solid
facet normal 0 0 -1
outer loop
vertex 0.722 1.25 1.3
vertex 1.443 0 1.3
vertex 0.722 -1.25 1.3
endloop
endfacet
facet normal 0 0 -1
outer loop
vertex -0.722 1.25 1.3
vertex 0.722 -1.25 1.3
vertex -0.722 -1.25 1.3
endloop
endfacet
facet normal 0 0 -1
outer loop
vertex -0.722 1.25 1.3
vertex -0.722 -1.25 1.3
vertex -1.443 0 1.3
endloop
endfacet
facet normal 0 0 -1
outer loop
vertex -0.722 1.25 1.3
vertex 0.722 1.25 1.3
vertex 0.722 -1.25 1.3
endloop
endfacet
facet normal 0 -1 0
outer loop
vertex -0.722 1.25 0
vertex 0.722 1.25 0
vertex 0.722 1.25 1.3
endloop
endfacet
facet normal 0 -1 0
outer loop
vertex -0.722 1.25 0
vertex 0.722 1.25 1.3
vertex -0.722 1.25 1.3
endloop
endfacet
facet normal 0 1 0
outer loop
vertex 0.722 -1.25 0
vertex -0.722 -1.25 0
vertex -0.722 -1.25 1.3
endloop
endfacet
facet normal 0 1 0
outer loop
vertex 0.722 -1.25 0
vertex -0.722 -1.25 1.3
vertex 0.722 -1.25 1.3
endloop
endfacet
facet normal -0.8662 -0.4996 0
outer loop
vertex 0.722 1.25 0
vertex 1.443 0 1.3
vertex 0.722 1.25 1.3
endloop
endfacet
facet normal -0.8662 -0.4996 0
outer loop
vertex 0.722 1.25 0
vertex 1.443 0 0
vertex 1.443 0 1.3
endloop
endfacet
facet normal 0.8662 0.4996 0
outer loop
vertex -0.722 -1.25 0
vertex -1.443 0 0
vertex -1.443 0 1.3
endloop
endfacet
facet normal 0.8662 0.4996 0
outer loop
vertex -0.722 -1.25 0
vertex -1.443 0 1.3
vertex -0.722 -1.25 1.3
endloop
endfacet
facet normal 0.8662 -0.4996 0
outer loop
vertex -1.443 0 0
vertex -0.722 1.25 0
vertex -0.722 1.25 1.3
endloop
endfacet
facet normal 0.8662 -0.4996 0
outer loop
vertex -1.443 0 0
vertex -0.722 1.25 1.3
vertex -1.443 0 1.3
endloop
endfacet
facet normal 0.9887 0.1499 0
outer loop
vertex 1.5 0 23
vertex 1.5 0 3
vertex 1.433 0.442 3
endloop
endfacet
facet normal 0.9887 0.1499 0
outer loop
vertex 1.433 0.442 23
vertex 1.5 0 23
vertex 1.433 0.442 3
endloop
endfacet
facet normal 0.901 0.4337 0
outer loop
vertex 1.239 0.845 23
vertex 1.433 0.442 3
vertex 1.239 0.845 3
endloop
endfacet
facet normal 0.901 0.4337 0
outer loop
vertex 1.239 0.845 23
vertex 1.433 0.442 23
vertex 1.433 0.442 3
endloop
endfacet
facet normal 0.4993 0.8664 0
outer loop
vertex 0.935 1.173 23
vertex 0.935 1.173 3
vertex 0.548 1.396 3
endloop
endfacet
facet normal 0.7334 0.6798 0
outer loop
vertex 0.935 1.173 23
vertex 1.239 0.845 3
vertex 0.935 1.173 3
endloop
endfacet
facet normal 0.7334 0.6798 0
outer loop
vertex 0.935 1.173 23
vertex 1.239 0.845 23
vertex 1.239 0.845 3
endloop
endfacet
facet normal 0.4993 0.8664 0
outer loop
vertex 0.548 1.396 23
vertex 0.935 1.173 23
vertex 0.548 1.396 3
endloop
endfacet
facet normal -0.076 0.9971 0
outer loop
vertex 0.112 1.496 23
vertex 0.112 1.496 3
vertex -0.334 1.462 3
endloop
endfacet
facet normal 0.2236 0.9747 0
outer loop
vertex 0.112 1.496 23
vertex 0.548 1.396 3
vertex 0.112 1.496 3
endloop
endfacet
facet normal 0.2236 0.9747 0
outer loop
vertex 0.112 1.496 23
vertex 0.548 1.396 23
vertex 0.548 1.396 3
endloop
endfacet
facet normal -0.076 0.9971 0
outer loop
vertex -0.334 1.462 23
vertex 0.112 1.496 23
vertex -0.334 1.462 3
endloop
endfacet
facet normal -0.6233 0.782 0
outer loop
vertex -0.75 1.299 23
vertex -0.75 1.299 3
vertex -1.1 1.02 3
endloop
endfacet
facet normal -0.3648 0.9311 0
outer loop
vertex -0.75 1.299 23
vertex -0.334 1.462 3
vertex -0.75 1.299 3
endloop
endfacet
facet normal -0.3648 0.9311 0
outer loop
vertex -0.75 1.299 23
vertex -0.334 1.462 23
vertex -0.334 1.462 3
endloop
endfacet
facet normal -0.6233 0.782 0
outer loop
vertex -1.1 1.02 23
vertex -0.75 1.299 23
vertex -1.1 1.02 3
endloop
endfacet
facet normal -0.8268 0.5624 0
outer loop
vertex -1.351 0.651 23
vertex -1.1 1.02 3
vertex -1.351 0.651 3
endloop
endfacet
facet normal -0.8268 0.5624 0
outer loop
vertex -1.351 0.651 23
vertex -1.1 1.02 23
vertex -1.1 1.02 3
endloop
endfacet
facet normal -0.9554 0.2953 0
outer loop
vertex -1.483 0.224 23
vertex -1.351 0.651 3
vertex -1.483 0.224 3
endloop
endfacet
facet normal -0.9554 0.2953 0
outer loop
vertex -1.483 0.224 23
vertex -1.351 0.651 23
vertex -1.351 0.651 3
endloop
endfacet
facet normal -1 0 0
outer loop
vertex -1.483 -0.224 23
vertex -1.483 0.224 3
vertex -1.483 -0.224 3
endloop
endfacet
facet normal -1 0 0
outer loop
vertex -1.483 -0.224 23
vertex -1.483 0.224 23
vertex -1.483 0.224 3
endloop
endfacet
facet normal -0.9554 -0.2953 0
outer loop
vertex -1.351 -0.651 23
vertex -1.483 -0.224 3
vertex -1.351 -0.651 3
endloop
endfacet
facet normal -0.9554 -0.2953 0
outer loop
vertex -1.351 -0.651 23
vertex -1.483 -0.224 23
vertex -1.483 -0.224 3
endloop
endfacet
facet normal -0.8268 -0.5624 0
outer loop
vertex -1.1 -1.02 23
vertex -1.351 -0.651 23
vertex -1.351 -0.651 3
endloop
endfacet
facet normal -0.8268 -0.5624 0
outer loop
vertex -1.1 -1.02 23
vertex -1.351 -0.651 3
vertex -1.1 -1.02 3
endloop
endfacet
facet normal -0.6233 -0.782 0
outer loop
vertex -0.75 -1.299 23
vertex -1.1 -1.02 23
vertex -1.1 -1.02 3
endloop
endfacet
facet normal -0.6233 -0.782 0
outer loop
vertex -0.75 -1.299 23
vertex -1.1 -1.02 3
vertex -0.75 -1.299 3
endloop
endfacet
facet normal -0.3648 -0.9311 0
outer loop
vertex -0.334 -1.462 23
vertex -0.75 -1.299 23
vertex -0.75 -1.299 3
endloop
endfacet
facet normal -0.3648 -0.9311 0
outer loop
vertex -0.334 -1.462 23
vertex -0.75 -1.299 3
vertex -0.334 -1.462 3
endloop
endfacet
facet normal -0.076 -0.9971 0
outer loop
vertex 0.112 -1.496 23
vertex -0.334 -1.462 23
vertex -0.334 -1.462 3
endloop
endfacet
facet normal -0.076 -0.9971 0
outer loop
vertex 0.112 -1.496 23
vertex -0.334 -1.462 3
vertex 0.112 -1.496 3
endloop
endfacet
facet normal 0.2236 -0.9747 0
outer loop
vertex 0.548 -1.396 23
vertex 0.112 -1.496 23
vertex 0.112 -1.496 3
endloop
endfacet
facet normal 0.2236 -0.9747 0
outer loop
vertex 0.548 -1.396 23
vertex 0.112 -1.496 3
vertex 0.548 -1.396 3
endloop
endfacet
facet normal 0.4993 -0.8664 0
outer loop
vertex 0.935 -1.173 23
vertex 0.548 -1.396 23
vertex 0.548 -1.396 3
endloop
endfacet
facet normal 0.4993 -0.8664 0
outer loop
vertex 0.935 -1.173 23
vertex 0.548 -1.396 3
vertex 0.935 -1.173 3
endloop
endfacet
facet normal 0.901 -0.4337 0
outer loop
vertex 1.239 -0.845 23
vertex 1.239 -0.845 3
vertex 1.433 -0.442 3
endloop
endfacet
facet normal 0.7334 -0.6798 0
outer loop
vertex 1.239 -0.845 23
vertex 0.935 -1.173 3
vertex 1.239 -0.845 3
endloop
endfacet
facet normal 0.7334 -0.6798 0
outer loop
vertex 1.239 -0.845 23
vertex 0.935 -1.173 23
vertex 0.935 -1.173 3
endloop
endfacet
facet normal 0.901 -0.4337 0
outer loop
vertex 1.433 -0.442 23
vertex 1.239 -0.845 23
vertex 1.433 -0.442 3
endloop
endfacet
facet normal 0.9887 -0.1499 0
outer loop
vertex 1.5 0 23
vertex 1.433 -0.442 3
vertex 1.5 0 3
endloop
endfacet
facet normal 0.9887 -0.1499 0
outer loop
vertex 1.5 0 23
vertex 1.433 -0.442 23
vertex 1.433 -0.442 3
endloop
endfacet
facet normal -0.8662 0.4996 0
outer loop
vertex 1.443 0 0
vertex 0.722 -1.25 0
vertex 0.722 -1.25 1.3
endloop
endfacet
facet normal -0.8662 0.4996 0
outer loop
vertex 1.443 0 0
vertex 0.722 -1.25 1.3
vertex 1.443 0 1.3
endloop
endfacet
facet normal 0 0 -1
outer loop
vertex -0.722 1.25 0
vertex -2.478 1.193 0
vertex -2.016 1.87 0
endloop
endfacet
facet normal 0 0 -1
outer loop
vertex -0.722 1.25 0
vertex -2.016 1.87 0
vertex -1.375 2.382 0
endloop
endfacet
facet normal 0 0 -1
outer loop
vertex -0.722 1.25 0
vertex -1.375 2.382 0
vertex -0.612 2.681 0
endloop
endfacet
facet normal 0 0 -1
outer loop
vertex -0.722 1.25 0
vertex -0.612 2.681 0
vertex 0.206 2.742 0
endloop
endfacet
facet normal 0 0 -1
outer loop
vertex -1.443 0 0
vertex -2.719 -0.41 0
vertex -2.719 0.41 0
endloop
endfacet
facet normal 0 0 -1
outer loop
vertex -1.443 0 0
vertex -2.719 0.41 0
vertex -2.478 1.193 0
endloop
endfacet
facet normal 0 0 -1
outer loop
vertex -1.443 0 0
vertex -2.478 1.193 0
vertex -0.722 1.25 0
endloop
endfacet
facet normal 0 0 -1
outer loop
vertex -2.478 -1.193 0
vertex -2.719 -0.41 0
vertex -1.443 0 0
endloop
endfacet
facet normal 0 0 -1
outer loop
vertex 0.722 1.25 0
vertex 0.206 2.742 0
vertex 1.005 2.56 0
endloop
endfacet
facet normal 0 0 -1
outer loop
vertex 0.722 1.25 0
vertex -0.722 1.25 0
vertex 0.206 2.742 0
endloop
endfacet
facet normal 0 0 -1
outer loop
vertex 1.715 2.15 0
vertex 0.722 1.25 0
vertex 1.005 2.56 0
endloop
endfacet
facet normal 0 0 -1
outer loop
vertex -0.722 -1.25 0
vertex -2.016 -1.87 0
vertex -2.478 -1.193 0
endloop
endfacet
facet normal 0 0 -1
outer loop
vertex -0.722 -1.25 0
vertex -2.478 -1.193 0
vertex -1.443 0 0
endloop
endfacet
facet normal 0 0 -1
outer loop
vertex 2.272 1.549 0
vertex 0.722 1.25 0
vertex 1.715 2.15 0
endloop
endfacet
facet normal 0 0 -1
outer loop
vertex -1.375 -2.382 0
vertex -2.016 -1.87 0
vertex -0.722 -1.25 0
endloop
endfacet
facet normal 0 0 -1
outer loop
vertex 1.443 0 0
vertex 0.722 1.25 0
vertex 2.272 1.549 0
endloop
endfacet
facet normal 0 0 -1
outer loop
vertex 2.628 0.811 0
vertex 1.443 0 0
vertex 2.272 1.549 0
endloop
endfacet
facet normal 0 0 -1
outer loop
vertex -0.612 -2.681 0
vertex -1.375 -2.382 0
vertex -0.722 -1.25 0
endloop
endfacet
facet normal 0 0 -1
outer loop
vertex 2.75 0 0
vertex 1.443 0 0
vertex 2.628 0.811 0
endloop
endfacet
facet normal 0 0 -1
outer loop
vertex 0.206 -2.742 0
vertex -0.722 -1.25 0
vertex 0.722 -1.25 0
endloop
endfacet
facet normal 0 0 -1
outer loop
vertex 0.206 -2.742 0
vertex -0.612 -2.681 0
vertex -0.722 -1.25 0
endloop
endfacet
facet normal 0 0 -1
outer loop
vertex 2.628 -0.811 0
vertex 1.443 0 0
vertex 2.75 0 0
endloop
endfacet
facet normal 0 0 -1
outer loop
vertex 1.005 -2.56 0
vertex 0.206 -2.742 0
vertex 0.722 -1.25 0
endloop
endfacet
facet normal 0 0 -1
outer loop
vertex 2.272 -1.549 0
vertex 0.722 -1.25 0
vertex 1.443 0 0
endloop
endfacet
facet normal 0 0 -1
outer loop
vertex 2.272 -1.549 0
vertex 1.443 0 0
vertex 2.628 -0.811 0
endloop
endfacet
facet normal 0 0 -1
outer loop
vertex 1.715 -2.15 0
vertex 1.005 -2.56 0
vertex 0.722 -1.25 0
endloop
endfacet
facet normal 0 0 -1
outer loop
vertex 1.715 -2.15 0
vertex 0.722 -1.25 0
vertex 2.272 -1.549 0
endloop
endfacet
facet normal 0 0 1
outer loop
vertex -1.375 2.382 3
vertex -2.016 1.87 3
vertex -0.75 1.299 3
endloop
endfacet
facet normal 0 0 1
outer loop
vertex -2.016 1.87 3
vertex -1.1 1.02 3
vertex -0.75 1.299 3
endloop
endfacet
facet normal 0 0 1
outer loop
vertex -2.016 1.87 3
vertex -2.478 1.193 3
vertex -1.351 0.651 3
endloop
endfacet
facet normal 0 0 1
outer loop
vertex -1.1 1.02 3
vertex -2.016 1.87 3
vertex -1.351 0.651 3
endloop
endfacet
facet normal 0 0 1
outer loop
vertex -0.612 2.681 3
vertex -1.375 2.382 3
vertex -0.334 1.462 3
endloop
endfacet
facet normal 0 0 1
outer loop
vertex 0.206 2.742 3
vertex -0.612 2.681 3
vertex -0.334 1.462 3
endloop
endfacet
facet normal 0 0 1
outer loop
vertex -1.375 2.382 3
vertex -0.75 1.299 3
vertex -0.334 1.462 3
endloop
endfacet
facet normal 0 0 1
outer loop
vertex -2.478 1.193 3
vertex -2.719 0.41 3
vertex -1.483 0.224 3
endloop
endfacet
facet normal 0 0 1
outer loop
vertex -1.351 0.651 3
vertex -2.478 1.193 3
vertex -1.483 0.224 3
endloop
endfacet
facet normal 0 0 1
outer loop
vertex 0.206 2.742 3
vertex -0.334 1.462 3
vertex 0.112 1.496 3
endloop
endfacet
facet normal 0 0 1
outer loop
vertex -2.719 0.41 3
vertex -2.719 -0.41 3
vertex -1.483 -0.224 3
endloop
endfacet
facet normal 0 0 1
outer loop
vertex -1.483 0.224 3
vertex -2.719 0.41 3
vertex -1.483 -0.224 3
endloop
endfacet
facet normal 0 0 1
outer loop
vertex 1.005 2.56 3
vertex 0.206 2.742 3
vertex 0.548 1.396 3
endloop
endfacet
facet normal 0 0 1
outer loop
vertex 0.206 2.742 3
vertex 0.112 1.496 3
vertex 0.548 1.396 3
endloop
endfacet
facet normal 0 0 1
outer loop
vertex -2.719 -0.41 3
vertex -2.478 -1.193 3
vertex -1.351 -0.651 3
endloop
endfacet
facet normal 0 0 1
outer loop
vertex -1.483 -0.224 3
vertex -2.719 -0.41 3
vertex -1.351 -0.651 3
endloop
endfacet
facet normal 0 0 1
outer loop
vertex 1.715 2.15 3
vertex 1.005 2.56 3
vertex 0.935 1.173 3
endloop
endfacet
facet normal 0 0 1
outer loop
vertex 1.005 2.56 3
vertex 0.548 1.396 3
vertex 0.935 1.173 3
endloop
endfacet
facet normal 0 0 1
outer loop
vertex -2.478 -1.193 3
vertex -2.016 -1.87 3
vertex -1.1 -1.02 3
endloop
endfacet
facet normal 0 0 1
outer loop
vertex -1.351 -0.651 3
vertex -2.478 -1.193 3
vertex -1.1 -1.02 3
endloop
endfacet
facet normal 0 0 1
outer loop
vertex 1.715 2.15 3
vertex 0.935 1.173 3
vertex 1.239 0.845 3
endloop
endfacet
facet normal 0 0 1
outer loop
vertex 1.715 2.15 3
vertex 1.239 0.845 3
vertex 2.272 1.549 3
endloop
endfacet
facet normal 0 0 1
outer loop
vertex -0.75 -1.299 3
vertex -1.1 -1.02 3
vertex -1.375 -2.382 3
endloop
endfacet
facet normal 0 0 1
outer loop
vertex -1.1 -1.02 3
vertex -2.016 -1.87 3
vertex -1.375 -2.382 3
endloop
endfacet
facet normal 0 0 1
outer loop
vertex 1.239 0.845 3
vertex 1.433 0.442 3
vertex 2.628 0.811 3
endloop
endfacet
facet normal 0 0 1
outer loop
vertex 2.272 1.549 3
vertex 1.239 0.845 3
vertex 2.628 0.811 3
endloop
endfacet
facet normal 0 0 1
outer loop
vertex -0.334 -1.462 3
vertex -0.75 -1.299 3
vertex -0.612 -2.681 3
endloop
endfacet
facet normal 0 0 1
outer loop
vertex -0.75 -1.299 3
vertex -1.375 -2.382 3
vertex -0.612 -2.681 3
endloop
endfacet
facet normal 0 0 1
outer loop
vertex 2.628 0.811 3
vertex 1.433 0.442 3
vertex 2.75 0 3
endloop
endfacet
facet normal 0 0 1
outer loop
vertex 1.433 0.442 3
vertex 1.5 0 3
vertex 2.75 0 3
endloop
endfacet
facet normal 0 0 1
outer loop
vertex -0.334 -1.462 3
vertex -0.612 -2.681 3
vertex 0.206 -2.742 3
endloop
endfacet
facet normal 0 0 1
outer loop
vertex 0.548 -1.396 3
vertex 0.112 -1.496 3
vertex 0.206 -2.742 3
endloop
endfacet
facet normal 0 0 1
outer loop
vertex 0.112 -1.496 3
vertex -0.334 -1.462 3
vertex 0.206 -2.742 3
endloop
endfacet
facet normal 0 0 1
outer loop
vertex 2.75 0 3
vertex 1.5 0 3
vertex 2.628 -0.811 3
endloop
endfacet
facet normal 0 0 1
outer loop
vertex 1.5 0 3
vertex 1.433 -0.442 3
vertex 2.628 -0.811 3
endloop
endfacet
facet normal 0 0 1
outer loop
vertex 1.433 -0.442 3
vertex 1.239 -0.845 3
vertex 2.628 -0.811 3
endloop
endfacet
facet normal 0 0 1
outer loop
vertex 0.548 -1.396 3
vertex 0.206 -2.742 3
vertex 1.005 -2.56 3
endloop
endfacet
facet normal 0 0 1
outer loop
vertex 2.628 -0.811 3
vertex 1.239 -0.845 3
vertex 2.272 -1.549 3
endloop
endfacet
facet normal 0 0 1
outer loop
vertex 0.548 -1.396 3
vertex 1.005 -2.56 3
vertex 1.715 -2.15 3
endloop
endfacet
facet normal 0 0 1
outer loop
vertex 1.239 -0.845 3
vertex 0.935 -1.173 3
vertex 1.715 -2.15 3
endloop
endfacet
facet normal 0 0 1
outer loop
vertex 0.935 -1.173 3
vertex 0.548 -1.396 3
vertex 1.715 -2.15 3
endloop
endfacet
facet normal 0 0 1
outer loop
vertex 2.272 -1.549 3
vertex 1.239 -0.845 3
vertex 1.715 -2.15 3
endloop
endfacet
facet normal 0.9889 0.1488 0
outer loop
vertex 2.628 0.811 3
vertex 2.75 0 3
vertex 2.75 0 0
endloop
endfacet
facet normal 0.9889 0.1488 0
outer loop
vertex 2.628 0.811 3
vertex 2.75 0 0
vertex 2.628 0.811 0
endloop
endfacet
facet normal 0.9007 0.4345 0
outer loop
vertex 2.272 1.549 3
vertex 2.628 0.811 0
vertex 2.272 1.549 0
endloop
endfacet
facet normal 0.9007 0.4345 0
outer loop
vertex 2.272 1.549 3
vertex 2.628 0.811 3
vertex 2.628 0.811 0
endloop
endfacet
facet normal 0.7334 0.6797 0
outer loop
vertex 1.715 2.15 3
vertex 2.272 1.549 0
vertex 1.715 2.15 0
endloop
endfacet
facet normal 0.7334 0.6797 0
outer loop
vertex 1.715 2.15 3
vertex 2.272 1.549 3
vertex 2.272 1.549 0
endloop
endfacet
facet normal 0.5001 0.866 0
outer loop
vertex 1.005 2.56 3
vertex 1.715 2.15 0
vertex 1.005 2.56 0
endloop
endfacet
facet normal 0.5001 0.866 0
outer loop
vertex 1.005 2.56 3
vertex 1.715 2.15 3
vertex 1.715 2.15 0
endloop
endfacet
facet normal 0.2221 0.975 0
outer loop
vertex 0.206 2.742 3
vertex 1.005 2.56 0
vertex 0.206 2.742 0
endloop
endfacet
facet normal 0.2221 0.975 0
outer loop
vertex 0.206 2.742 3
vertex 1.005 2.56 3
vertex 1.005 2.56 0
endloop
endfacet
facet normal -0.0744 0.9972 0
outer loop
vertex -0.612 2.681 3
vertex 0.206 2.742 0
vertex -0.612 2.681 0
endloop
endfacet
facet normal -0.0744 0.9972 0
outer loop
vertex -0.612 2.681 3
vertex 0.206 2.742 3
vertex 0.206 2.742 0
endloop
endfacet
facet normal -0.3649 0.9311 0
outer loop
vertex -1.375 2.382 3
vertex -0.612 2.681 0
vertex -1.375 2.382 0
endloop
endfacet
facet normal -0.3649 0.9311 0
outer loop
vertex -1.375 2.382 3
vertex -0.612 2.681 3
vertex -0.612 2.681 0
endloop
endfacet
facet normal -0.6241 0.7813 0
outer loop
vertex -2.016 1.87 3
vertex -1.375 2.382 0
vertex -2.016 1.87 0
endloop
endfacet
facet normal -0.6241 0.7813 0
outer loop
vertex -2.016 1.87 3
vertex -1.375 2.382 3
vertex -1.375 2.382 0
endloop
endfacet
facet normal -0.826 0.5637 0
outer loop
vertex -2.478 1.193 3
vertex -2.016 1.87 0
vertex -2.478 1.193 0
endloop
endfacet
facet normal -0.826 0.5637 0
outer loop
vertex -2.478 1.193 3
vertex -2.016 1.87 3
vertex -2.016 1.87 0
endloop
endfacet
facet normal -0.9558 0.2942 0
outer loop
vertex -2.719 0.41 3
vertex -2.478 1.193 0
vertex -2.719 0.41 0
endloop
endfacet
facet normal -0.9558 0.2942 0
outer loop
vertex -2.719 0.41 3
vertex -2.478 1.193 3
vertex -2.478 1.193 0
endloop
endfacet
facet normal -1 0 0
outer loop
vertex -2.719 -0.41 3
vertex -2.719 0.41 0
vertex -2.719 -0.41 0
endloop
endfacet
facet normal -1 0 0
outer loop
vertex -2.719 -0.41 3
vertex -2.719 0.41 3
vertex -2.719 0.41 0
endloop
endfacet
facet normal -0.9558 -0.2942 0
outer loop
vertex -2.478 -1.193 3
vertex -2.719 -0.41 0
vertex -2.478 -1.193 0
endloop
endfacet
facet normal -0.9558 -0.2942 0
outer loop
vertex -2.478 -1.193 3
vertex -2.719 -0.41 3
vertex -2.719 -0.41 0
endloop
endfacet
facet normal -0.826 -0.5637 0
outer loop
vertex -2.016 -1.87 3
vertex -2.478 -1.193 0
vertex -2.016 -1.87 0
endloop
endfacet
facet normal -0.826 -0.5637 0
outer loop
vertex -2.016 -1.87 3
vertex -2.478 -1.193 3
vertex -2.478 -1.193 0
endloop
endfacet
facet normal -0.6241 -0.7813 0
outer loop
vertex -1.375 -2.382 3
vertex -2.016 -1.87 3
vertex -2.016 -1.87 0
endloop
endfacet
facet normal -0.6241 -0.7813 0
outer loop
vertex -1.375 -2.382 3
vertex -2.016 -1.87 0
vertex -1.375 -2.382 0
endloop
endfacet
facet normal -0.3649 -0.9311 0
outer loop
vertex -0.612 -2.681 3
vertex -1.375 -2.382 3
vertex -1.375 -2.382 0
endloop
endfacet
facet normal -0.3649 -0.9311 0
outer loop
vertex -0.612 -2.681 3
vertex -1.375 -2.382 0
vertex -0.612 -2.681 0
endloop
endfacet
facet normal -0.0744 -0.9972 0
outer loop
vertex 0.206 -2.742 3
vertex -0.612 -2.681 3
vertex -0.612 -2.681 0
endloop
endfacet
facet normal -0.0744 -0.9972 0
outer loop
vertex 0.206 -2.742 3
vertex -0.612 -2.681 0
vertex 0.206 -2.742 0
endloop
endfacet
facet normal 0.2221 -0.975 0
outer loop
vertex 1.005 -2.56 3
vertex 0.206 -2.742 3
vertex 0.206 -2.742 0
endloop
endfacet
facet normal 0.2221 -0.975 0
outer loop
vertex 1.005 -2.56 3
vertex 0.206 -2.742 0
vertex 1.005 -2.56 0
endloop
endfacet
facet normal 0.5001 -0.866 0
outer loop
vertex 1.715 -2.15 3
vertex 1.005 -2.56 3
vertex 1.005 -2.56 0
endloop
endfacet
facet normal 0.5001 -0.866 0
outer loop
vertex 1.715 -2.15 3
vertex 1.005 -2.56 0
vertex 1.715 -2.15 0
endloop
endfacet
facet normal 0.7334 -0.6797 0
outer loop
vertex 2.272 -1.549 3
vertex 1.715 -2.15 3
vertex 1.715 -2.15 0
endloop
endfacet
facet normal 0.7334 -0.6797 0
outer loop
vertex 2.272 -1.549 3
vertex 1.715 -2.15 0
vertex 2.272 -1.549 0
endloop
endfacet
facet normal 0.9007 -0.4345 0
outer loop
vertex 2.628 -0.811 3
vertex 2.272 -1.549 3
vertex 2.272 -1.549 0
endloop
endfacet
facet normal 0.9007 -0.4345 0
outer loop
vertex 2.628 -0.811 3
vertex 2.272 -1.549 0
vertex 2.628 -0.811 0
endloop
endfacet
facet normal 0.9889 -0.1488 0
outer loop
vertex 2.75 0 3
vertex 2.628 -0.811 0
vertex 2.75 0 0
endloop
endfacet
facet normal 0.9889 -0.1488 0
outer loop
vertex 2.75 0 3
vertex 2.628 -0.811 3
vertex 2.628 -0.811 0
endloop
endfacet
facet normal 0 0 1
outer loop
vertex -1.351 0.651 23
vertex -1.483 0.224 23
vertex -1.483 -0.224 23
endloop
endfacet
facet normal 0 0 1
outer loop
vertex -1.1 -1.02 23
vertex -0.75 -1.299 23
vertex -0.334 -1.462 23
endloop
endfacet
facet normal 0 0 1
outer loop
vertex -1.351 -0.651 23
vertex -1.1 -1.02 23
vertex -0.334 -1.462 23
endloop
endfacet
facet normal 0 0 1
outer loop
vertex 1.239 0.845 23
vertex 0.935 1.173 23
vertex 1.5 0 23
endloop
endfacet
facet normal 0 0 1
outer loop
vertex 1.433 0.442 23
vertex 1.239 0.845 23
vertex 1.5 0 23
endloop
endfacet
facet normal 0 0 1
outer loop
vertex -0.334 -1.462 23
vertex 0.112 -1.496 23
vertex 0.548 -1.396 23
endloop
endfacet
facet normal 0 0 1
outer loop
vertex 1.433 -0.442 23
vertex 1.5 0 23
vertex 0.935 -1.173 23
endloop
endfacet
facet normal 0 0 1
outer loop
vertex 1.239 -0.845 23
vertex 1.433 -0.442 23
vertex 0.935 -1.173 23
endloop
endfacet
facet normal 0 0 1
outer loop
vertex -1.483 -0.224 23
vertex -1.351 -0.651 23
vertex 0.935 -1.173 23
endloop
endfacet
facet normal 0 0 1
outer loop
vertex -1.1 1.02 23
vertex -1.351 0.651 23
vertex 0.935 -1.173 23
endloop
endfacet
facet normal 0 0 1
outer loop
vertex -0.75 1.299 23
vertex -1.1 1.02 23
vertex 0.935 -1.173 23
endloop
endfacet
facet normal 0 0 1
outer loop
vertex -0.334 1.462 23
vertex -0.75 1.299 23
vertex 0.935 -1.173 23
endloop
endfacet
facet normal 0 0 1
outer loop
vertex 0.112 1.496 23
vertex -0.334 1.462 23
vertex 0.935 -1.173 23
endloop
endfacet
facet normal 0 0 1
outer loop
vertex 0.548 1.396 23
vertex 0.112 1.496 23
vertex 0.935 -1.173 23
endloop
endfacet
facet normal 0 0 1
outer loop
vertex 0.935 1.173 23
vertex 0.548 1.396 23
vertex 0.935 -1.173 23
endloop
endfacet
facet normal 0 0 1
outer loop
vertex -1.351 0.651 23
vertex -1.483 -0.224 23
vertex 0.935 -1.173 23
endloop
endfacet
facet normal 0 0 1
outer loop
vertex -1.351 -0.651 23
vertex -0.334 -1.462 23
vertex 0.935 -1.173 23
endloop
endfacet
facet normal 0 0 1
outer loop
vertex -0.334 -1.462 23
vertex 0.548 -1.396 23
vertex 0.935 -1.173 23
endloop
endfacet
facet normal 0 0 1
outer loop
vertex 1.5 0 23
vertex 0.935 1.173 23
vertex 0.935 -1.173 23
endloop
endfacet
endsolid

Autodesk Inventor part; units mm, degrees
ref_plane "YZ Plane" through (0, 0, 0) normal (1, 0, 0) x (0, 1, 0)
ref_plane "XZ Plane" through (0, 0, 0) normal (0, 1, 0) x (-1, 0, 0)
ref_plane "XY Plane" through (0, 0, 0) normal (0, 0, 1) x (1, 0, 0)
sketch "Sketch1" plane through (0, 0, 0) normal (0, 1, 0) x (-1, 0, 0)
  line L0 (0, 0) -> (-2.75, 0)
  line L1 (-2.75, 0) -> (-2.75, 3)
  line L2 (-2.75, 3) -> (-1.5, 3)
  line L3 (-1.5, 3) -> (-1.5, 23)
  line L4 (-1.5, 23) -> (0, 23)
  line L5 (0, 23) -> (0, 0)
  dimension "ScrewLength" = 20
  dimension "Diameter" = 5.5
  dimension "Metric" = 3
  dimension "HeadLength" = 3
revolve "Revolution1" add sketch "Sketch1" angle 360 about axis through (0, 0, 23) along (0, 0, -1)
thread "Thread1" size "M3x0.5" class "6g" standard "ANSI Metric M Profile" full length
sketch "Sketch2" plane through (0, 0, 0) normal (0, 0, -1) x (-1, 0, 0)
  line L0 (0.7217, 1.25) -> (1.4434, 0)
  line L1 (1.4434, 0) -> (0.7217, -1.25)
  line L2 (0.7217, -1.25) -> (-0.7217, -1.25)
  line L3 (-0.7217, -1.25) -> (-1.4434, 0)
  line L4 (-1.4434, 0) -> (-0.7217, 1.25)
  line L5 (-0.7217, 1.25) -> (0.7217, 1.25)
  point P0 (0, 0)
  point P1 (0, 0)
  dimension "WidthAcrossFlat" = 2.5
extrude "Extrusion1" cut sketch "Sketch2" against normal blind 1.3
properties part number "UC-0320" material "Stainless Steel AISI 304"
